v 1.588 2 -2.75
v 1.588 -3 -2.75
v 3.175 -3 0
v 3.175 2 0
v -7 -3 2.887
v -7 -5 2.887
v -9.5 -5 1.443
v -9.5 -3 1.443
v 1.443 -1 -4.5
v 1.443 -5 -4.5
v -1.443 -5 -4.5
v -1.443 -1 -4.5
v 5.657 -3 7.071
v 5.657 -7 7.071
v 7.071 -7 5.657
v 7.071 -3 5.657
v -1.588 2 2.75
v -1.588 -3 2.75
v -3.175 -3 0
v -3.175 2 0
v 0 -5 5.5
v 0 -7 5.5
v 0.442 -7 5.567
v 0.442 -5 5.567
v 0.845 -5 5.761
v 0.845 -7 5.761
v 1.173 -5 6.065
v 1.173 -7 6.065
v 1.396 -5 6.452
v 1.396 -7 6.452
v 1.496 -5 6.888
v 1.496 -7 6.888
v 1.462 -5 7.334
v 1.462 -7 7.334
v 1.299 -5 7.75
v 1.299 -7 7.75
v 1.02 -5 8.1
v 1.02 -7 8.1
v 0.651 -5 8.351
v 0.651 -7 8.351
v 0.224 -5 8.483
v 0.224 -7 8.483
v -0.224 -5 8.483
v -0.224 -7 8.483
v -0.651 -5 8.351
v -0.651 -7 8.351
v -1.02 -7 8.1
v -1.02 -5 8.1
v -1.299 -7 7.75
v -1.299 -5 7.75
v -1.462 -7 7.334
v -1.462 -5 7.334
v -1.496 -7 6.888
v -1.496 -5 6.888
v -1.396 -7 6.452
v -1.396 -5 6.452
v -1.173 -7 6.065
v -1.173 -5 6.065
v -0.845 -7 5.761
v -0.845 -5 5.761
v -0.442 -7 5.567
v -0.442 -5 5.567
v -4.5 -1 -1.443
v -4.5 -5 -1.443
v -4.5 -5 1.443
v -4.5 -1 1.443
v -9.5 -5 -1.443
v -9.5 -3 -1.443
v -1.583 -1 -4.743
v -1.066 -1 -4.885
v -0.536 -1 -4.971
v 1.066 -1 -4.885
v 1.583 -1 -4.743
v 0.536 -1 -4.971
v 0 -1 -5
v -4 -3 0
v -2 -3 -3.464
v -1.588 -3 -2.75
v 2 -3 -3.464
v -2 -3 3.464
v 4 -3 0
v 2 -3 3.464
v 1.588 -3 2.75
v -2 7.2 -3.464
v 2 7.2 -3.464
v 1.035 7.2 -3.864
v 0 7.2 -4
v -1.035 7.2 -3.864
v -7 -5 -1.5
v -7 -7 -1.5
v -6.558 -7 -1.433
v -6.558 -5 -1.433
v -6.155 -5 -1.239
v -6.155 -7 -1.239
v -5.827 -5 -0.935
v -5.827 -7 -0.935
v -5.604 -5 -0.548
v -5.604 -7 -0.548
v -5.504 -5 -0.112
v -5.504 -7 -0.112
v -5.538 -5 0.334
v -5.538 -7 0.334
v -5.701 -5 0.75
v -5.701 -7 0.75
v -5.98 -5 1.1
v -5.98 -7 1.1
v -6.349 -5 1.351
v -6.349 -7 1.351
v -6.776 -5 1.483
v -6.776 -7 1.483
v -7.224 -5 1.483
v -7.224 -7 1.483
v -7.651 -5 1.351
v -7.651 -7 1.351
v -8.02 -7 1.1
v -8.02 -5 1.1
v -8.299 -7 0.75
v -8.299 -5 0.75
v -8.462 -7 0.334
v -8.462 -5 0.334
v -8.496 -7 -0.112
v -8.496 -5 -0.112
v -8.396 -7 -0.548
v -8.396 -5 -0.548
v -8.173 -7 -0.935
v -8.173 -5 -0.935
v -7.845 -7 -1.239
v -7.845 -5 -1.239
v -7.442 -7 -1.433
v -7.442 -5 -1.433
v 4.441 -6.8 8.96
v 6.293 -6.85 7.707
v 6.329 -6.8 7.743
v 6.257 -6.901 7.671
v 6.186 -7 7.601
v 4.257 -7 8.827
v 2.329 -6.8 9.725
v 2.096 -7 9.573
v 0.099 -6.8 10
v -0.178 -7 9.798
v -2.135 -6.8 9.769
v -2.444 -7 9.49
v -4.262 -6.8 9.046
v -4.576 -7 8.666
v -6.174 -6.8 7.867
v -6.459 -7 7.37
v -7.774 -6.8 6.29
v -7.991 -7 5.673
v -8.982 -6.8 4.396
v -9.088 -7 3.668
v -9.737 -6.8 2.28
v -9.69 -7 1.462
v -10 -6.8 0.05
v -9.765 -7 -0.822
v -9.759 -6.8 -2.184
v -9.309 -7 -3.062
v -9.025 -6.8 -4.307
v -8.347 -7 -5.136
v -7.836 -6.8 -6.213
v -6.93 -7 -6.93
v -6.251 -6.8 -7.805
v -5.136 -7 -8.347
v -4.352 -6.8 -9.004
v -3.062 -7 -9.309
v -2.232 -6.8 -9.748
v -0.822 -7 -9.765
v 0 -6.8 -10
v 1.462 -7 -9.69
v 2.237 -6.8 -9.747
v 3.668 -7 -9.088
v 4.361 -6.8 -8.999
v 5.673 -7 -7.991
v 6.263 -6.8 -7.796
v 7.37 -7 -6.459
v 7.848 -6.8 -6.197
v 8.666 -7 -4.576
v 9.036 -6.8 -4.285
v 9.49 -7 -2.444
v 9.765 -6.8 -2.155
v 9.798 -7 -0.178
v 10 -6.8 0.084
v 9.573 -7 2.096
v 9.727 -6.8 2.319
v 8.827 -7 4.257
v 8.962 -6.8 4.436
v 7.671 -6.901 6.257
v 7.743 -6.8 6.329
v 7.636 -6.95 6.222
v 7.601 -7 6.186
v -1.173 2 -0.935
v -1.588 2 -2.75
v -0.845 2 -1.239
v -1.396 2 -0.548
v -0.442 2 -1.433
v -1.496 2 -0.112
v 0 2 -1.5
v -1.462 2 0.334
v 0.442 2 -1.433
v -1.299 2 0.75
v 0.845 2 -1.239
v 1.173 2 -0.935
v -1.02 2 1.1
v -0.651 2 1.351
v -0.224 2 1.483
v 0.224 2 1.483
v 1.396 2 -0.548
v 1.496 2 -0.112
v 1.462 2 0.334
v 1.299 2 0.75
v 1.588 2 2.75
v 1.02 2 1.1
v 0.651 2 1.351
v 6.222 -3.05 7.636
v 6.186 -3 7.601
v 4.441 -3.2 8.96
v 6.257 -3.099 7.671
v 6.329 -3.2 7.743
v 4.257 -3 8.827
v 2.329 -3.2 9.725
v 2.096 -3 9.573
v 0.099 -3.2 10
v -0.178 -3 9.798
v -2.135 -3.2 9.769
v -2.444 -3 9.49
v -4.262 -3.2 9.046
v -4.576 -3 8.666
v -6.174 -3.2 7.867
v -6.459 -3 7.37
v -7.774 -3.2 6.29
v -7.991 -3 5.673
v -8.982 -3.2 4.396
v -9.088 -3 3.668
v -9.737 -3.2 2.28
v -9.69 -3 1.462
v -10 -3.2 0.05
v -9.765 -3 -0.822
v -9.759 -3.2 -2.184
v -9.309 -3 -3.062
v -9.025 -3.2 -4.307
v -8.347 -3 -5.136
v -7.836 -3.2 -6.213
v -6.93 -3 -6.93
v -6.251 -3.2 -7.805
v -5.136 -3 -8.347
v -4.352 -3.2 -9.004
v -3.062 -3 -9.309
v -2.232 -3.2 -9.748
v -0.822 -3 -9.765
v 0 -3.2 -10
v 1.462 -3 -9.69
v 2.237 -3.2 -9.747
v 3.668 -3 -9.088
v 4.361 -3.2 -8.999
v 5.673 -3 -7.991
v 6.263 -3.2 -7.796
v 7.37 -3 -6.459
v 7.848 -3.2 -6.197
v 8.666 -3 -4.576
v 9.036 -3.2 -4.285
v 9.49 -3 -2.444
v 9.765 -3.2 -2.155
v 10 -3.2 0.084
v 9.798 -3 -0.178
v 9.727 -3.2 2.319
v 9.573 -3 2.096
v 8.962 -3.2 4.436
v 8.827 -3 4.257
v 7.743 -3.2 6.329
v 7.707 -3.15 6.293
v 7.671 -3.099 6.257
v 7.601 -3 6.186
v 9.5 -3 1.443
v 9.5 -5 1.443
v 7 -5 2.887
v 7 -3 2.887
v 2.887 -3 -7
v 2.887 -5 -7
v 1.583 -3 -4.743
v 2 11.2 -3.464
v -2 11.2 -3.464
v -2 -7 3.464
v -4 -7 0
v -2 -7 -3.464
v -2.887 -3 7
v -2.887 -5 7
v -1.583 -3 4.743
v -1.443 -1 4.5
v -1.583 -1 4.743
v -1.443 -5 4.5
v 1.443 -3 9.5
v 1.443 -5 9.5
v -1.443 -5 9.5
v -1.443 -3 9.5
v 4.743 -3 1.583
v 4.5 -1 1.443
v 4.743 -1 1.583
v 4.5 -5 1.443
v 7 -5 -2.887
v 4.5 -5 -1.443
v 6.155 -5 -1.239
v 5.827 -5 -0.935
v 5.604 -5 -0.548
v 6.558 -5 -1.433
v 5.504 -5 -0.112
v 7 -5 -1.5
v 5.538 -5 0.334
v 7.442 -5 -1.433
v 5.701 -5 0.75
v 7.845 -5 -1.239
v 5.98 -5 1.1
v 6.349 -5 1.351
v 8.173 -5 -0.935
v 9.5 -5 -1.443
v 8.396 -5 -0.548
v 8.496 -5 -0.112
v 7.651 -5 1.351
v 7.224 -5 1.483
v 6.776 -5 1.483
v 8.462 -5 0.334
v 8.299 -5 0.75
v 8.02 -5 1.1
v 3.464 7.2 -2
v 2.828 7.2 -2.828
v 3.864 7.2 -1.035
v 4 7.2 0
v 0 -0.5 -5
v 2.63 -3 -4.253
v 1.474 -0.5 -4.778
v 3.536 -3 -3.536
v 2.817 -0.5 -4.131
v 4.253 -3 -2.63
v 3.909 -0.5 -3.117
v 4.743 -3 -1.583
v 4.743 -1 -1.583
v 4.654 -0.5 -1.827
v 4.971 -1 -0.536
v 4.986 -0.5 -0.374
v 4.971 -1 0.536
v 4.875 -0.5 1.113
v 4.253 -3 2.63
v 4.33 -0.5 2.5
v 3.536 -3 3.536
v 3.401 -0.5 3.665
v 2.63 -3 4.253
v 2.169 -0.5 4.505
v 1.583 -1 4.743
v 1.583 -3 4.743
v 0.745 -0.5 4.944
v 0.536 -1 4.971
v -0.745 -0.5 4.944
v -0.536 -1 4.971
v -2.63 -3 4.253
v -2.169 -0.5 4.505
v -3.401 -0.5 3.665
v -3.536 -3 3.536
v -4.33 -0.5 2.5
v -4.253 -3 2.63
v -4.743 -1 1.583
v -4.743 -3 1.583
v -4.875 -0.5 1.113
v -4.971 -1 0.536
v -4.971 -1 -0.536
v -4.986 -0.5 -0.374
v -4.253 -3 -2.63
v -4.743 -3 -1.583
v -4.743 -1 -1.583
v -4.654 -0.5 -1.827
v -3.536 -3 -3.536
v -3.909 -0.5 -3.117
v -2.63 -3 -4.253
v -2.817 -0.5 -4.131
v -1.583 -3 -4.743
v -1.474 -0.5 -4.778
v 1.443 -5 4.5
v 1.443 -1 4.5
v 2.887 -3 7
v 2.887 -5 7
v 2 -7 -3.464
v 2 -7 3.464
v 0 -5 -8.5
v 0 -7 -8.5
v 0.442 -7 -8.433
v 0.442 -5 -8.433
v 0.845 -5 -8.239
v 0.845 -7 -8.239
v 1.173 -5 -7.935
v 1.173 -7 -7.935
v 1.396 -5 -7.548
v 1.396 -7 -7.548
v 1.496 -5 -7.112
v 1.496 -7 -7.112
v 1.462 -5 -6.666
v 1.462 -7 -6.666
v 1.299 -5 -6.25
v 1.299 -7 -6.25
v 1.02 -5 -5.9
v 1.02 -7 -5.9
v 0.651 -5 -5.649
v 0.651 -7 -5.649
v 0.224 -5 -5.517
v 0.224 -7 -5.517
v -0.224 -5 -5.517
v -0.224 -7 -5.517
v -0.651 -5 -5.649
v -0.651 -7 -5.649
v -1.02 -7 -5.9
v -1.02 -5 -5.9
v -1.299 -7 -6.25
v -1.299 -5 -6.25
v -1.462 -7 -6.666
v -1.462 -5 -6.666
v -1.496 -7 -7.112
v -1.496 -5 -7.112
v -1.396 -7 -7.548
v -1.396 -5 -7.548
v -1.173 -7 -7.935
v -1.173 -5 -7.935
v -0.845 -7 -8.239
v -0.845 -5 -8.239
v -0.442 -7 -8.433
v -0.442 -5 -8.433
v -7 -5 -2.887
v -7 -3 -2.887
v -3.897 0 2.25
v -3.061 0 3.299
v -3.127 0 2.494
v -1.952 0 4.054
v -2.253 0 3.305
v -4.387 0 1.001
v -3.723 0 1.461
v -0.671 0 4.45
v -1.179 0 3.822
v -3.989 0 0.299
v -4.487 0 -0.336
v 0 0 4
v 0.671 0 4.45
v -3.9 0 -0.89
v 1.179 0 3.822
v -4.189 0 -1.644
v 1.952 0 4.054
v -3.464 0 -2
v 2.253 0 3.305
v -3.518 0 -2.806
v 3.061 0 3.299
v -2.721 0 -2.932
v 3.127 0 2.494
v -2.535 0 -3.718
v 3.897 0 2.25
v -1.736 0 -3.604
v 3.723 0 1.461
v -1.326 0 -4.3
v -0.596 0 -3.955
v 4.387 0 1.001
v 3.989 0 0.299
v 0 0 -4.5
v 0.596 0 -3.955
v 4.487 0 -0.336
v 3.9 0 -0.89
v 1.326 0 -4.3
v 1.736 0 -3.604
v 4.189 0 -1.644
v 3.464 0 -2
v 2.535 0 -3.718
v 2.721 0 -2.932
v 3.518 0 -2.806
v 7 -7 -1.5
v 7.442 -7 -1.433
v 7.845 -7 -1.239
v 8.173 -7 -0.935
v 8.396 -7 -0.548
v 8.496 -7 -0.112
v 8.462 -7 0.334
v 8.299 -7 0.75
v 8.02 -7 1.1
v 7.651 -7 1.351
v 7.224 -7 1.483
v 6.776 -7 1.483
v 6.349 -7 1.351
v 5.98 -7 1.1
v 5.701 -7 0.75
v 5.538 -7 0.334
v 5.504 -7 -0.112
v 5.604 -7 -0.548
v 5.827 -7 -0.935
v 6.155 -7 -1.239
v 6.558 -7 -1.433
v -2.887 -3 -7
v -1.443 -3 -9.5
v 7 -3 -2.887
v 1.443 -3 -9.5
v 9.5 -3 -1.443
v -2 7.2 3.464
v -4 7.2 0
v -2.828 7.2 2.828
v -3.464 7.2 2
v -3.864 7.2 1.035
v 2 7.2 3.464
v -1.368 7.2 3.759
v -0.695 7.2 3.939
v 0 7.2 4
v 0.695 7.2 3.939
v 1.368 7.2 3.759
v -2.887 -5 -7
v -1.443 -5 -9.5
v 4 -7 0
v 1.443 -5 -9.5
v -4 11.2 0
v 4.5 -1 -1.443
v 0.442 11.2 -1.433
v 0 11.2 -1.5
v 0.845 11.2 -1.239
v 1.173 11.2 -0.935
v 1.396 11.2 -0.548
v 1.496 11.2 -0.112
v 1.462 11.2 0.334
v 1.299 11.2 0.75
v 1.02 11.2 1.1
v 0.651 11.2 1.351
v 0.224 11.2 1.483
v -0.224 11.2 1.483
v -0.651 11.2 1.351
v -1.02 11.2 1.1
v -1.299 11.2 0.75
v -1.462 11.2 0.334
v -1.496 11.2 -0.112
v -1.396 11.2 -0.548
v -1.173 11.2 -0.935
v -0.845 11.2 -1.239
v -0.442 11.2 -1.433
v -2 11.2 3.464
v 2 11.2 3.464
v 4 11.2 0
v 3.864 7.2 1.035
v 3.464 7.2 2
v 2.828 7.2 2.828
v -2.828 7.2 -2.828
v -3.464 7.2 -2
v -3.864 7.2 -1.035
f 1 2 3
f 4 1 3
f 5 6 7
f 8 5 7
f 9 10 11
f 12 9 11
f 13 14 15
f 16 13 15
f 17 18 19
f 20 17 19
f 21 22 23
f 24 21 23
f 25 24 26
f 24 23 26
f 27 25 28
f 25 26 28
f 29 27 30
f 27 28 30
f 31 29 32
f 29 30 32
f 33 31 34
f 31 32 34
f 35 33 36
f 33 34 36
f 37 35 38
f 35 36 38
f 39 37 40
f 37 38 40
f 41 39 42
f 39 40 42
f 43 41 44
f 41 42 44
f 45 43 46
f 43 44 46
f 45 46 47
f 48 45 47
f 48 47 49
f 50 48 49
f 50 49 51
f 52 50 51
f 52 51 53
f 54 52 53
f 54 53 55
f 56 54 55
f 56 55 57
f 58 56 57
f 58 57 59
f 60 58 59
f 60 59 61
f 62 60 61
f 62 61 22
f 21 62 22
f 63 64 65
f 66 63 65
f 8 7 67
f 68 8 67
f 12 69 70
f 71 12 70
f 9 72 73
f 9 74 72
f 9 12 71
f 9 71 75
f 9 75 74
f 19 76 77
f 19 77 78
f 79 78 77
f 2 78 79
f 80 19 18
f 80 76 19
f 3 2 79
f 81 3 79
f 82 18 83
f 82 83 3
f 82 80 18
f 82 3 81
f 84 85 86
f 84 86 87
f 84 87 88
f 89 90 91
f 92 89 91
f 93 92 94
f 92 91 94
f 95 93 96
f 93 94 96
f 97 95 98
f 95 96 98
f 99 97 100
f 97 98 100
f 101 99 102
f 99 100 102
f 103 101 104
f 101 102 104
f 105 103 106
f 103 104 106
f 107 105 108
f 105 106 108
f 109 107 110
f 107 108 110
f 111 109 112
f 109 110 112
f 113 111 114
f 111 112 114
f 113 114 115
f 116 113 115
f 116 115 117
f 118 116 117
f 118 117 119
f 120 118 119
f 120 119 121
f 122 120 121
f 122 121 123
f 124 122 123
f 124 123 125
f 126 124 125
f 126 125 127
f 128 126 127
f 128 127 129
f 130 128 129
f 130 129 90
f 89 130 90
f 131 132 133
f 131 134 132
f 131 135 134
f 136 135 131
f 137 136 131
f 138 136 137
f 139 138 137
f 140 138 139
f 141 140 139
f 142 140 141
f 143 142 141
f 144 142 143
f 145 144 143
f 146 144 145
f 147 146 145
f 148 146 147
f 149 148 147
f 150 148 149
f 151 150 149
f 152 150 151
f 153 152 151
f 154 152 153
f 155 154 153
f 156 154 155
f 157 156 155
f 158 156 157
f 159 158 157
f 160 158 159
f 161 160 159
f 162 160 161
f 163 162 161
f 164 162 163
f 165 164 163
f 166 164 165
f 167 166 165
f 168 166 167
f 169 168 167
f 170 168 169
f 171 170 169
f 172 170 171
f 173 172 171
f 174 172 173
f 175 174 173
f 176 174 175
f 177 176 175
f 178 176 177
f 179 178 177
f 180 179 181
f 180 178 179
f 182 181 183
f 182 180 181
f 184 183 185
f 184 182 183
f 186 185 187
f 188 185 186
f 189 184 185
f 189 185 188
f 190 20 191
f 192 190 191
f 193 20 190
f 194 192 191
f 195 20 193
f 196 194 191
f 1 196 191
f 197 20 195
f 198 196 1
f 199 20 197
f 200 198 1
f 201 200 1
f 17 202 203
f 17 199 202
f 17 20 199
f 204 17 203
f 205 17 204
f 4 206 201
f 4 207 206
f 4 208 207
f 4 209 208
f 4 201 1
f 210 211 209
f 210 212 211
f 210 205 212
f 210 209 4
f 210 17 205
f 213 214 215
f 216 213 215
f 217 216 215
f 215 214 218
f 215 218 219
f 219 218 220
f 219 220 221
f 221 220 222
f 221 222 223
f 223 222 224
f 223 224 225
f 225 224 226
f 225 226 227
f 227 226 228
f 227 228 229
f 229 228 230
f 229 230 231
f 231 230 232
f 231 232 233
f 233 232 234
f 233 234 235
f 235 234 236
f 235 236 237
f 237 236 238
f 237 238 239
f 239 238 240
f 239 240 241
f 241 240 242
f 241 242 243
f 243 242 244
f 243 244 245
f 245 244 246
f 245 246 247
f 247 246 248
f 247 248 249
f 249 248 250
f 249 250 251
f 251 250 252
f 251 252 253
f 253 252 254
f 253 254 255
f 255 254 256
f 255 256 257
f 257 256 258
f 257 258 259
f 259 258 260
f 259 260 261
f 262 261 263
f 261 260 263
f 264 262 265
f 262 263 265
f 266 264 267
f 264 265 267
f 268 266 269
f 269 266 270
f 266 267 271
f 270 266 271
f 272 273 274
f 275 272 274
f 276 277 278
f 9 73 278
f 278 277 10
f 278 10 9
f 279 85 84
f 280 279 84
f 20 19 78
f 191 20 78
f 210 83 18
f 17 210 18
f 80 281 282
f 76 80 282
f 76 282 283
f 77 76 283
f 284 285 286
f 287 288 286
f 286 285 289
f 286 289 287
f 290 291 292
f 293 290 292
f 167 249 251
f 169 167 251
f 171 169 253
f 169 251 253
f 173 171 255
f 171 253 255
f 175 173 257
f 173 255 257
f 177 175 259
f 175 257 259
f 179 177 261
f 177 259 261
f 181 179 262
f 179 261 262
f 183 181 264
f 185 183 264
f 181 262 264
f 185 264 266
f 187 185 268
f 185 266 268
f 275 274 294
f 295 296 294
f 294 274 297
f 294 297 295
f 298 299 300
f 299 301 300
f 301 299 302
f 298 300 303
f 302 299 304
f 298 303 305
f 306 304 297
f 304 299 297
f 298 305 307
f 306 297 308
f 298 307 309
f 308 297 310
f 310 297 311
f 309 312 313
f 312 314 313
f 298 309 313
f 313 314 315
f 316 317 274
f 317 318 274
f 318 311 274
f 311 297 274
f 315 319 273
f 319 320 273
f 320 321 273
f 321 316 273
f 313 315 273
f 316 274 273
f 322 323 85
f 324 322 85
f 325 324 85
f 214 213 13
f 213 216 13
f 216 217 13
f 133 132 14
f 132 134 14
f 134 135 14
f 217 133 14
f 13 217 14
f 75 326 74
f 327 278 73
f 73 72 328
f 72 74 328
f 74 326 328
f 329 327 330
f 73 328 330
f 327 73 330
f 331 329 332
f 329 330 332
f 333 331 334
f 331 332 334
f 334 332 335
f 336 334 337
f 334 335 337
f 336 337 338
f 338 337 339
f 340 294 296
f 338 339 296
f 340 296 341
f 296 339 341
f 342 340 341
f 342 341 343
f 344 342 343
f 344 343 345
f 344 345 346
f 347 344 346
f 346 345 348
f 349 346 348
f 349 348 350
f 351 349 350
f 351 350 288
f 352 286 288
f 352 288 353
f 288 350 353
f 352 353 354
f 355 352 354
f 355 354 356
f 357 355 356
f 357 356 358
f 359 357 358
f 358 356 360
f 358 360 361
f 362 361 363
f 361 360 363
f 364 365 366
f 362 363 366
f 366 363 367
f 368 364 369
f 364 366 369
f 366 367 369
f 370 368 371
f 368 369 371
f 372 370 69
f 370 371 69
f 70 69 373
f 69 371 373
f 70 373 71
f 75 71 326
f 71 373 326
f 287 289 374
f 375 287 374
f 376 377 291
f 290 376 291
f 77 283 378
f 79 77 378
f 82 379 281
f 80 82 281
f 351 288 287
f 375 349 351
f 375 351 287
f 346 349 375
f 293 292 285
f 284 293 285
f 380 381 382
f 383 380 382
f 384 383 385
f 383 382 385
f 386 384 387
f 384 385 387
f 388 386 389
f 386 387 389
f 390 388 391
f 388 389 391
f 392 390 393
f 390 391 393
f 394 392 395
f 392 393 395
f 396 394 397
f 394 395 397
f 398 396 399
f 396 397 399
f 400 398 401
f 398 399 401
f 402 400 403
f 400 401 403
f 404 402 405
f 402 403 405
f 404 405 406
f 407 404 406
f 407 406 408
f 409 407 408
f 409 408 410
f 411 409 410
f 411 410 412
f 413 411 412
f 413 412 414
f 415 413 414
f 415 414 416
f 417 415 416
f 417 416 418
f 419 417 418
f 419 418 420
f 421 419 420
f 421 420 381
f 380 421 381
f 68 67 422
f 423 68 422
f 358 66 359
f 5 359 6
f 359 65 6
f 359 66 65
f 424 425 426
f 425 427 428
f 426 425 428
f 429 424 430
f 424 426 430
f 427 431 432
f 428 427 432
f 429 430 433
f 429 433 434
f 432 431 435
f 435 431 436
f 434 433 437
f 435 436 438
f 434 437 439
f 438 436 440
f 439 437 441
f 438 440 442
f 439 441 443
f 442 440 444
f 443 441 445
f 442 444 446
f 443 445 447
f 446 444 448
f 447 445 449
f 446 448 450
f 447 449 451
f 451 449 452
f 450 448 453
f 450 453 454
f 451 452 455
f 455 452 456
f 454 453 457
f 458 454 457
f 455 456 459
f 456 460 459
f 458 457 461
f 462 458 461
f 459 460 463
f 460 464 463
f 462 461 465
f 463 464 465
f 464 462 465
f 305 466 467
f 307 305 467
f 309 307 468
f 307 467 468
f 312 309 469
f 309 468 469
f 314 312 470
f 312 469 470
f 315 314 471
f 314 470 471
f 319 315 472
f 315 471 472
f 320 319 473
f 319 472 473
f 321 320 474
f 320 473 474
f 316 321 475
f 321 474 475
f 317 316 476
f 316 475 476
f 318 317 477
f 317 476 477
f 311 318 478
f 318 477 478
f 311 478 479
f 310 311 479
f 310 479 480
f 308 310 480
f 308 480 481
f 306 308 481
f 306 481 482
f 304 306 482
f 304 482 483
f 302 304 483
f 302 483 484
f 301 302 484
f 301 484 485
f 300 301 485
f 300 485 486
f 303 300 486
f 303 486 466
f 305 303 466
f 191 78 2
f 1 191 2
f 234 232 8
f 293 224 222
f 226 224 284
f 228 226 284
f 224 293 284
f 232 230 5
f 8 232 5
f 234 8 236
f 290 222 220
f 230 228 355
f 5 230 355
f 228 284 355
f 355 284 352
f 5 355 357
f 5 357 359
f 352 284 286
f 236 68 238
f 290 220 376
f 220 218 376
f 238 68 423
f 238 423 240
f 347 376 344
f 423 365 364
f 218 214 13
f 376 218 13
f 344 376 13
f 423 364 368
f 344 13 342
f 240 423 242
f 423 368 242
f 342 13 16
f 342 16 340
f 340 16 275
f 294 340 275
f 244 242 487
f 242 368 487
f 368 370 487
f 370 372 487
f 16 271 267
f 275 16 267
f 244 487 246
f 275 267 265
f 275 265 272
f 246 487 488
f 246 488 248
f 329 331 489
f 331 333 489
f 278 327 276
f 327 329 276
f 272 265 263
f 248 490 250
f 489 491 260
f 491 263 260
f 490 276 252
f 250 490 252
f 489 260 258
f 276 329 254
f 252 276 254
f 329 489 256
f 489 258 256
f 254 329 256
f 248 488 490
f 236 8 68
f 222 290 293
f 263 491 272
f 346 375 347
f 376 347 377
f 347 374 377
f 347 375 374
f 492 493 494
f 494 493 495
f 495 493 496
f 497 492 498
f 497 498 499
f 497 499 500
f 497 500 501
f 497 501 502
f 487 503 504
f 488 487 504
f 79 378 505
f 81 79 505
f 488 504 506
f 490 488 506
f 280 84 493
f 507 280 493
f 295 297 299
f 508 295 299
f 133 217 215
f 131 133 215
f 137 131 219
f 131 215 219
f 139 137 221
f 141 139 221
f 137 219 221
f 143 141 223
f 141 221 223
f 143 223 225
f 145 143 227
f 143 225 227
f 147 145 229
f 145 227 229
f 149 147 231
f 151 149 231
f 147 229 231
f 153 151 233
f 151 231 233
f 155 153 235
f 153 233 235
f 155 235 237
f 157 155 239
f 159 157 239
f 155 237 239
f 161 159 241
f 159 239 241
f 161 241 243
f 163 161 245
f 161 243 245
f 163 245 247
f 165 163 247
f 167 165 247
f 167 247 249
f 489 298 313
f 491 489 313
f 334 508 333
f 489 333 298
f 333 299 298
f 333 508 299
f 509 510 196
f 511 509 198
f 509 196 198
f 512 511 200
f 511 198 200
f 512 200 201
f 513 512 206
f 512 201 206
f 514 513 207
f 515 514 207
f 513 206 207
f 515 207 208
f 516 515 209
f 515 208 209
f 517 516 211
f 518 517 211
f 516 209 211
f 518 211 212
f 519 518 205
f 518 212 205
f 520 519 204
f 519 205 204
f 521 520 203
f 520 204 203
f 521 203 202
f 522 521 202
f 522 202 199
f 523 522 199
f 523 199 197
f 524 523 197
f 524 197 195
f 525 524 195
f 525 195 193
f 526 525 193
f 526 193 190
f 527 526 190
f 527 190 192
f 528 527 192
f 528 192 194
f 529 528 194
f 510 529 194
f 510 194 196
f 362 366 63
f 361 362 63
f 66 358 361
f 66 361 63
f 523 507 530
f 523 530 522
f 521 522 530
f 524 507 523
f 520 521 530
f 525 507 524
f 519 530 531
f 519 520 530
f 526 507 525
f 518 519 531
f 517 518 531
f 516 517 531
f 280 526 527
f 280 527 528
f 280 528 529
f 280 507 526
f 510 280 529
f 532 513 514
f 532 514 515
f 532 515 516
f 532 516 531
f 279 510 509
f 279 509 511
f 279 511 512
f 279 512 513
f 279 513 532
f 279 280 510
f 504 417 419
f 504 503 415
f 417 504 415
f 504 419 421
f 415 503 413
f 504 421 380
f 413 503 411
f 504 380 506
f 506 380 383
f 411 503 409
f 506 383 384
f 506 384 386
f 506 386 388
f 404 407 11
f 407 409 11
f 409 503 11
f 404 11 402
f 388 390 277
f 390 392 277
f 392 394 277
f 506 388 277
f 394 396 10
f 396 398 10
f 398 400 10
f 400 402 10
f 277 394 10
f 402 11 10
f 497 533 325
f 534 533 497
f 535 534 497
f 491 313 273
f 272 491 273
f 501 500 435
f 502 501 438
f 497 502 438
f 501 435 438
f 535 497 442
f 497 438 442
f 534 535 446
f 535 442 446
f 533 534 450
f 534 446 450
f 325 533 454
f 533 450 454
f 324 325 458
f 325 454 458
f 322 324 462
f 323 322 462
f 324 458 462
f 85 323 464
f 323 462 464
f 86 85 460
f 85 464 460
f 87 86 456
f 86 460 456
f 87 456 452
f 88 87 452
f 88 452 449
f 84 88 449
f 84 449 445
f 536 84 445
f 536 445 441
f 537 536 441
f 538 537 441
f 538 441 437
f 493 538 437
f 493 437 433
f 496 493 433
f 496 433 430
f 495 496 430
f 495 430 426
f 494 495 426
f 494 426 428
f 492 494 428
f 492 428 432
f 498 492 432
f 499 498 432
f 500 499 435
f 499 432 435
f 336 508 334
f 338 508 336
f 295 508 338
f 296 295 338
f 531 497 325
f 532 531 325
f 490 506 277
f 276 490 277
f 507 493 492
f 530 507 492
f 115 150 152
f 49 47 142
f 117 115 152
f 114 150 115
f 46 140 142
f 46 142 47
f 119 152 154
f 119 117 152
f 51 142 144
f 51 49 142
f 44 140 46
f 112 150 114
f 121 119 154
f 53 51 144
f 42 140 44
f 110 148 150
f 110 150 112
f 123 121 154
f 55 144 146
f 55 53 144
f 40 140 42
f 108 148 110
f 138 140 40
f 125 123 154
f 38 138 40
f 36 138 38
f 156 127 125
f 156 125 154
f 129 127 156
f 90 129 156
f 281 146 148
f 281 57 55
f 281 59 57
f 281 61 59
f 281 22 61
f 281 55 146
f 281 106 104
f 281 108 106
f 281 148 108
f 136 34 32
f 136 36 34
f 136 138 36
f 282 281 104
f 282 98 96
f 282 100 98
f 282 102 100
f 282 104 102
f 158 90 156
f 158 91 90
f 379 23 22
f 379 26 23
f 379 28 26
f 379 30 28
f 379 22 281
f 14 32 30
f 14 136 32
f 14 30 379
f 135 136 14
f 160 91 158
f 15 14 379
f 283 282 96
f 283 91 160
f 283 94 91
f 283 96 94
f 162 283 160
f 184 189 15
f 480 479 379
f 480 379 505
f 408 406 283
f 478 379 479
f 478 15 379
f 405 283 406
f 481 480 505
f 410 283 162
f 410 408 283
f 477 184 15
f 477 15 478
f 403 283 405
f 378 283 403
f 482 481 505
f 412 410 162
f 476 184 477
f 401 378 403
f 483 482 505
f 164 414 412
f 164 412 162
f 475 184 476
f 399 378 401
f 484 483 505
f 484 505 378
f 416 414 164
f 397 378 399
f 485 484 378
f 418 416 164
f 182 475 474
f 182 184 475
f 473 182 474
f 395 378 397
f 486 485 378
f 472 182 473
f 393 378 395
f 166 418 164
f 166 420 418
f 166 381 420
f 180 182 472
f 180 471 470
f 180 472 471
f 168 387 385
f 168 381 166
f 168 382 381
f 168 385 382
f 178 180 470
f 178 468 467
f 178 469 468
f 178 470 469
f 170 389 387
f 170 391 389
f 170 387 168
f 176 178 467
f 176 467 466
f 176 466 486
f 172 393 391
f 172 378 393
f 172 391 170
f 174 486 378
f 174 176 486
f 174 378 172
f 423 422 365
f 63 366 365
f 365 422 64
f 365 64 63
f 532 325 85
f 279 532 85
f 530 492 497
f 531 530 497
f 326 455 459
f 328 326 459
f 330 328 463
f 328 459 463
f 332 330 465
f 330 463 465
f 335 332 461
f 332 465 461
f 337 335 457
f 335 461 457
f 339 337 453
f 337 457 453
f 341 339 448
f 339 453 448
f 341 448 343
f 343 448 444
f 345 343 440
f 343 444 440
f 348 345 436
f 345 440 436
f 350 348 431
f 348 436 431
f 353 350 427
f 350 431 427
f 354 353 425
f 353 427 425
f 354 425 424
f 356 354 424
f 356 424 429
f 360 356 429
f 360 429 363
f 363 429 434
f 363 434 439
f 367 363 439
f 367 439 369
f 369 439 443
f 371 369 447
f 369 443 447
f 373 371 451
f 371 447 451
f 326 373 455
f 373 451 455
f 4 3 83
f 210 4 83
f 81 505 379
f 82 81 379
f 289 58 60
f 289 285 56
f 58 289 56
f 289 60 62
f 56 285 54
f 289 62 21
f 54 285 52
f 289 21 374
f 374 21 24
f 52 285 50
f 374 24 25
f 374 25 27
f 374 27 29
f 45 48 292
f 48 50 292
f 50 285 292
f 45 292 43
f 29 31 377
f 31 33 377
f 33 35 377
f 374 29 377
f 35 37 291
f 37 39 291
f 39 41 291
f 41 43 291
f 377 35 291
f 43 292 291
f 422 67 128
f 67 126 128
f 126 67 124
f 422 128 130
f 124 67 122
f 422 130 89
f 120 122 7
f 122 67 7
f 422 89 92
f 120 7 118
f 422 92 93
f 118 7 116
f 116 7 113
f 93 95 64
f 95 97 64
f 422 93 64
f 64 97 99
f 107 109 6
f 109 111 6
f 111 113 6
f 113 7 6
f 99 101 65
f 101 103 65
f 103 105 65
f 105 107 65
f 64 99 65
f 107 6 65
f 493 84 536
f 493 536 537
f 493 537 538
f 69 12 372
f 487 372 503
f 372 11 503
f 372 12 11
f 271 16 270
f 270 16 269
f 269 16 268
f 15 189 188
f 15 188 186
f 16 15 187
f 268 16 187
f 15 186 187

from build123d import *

# Parameters (mm, degrees)
SKETCH1_R           = 4
BOSS_EXTRUDE1_DEPTH = 7.2
BOSS_EXTRUDE2_DEPTH = 4
SKETCH3_R           = 5
BOSS_EXTRUDE3_DEPTH = 3
CHAMFER1_SIZE       = 0.5
SKETCH4_R           = 10
BOSS_EXTRUDE4_DEPTH = 4
CHAMFER2_SIZE       = 0.2
SKETCH5_R           = 1.5
CUT_EXTRUDE1_DEPTH  = 24.048644212
SKETCH6_R           = 1.5
CUT_EXTRUDE2_DEPTH  = 4
SKETCH7_R           = 1.5
CUT_EXTRUDE3_DEPTH  = 4
CUT_EXTRUDE4_START  = -2
SKETCH7_3_R         = 1.5
CUT_EXTRUDE4_DEPTH  = 4
CUT_EXTRUDE5_DEPTH  = 5
CUT_EXTRUDE6_DEPTH  = 10


with BuildPart() as part:
    # Sketch1 → Boss-Extrude1 (new body)
    with BuildSketch(Plane(origin=(0, 0, 0), x_dir=(1, 0, 0), z_dir=(0, 1, 0))):
        Circle(SKETCH1_R)
    extrude(amount=BOSS_EXTRUDE1_DEPTH)

    # Sketch2 → Boss-Extrude2 (add)
    with BuildSketch(Plane(origin=(0, 7.2, 0), x_dir=(1, 0, 0), z_dir=(0, 1, 0))):
        Polygon((4, 0), (2, 3.464101615), (-2, 3.464101615), (-4, 0), (-2, -3.464101615), (2, -3.464101615), align=None)
    extrude(amount=BOSS_EXTRUDE2_DEPTH)

    # Sketch3 → Boss-Extrude3 (add)
    with BuildSketch(Plane.XZ):
        Circle(SKETCH3_R)
    extrude(amount=BOSS_EXTRUDE3_DEPTH)

    # Chamfer1
    chamfer1_edges = [part.edges().sort_by_distance(p)[0] for p in [
        (-5, 0, 0),
    ]]
    chamfer(chamfer1_edges, length=CHAMFER1_SIZE)

    # Sketch4 → Boss-Extrude4 (add)
    with BuildSketch(Plane.XZ.offset(3)):
        Circle(SKETCH4_R)
    extrude(amount=BOSS_EXTRUDE4_DEPTH)

    # Chamfer2
    chamfer2_edges = [part.edges().sort_by_distance(p)[0] for p in [
        (-10, -7, 0),
        (-10, -3, 0),
    ]]
    chamfer(chamfer2_edges, length=CHAMFER2_SIZE)

    # Sketch5 → Cut-Extrude1 (cut, through all)
    with BuildSketch(Plane.XZ.offset(7)):
        Circle(SKETCH5_R)
    extrude(amount=-CUT_EXTRUDE1_DEPTH, mode=Mode.SUBTRACT)

    # Sketch6 → Cut-Extrude2 (cut)
    with BuildSketch(Plane.XZ.offset(7)):
        Polygon((4, 0), (2, 3.464101615), (-2, 3.464101615), (-4, 0), (-2, -3.464101615), (2, -3.464101615), align=None)
        Circle(SKETCH6_R, mode=Mode.SUBTRACT)
    extrude(amount=-CUT_EXTRUDE2_DEPTH, mode=Mode.SUBTRACT)

    # Sketch7 → Cut-Extrude3 (cut)
    with BuildSketch(Plane.XZ.offset(7)):
        with Locations((-7, 0)):
            Circle(SKETCH7_R)
        with Locations((0, 7)):
            Circle(SKETCH7_R)
        with Locations((7, 0)):
            Circle(SKETCH7_R)
        with Locations((0, -7)):
            Circle(SKETCH7_R)
    extrude(amount=-CUT_EXTRUDE3_DEPTH, mode=Mode.SUBTRACT)

    # Sketch7<3> → Cut-Extrude4 (cut)
    # profile 1 of 4: a face of its own
    with BuildSketch(Plane.XZ.offset(7).offset(CUT_EXTRUDE4_START)):
        Polygon((1.443375673, 4.5), (2.886751346, 7), (1.443375673, 9.5), (-1.443375673, 9.5), (-2.886751346, 7), (-1.443375673, 4.5), align=None)
        with Locations((0, 7)):
            Circle(SKETCH7_3_R, mode=Mode.SUBTRACT)
    # profile 2 of 4: a face of its own
    with BuildSketch(Plane.XZ.offset(7).offset(CUT_EXTRUDE4_START)):
        Polygon((-4.5, 1.443375673), (-7, 2.886751346), (-9.5, 1.443375673), (-9.5, -1.443375673), (-7, -2.886751346), (-4.5, -1.443375673), align=None)
        with Locations((-7, 0)):
            Circle(SKETCH7_3_R, mode=Mode.SUBTRACT)
    # profile 3 of 4: a face of its own
    with BuildSketch(Plane.XZ.offset(7).offset(CUT_EXTRUDE4_START)):
        Polygon((4.5, -1.443375673), (7, -2.886751346), (9.5, -1.443375673), (9.5, 1.443375673), (7, 2.886751346), (4.5, 1.443375673), align=None)
        with Locations((7, 0)):
            Circle(SKETCH7_3_R, mode=Mode.SUBTRACT)
    # profile 4 of 4: a face of its own
    with BuildSketch(Plane.XZ.offset(7).offset(CUT_EXTRUDE4_START)):
        Polygon((-1.443375673, -4.5), (-2.886751346, -7), (-1.443375673, -9.5), (1.443375673, -9.5), (2.886751346, -7), (1.443375673, -4.5), align=None)
        with Locations((0, -7)):
            Circle(SKETCH7_3_R, mode=Mode.SUBTRACT)
    extrude(amount=-CUT_EXTRUDE4_DEPTH, mode=Mode.SUBTRACT)

    # Sketch8 → Cut-Extrude5 (cut)
    with BuildSketch(Plane.XZ.offset(3)):
        Polygon((1.58771324, 2.75), (-1.58771324, 2.75), (-3.175426481, 0), (-1.58771324, -2.75), (1.58771324, -2.75), (3.175426481, 0), align=None)
    extrude(amount=-CUT_EXTRUDE5_DEPTH, mode=Mode.SUBTRACT)

    # Sketch9 → Cut-Extrude6 (cut)
    with BuildSketch(Plane.XZ.offset(7)):
        Polygon((8.485281374, 9.899494937), (5.656854249, 7.071067812), (7.071067812, 5.656854249), (9.899494937, 8.485281374), align=None)
    extrude(amount=-CUT_EXTRUDE6_DEPTH, mode=Mode.SUBTRACT)


solid = part.part
